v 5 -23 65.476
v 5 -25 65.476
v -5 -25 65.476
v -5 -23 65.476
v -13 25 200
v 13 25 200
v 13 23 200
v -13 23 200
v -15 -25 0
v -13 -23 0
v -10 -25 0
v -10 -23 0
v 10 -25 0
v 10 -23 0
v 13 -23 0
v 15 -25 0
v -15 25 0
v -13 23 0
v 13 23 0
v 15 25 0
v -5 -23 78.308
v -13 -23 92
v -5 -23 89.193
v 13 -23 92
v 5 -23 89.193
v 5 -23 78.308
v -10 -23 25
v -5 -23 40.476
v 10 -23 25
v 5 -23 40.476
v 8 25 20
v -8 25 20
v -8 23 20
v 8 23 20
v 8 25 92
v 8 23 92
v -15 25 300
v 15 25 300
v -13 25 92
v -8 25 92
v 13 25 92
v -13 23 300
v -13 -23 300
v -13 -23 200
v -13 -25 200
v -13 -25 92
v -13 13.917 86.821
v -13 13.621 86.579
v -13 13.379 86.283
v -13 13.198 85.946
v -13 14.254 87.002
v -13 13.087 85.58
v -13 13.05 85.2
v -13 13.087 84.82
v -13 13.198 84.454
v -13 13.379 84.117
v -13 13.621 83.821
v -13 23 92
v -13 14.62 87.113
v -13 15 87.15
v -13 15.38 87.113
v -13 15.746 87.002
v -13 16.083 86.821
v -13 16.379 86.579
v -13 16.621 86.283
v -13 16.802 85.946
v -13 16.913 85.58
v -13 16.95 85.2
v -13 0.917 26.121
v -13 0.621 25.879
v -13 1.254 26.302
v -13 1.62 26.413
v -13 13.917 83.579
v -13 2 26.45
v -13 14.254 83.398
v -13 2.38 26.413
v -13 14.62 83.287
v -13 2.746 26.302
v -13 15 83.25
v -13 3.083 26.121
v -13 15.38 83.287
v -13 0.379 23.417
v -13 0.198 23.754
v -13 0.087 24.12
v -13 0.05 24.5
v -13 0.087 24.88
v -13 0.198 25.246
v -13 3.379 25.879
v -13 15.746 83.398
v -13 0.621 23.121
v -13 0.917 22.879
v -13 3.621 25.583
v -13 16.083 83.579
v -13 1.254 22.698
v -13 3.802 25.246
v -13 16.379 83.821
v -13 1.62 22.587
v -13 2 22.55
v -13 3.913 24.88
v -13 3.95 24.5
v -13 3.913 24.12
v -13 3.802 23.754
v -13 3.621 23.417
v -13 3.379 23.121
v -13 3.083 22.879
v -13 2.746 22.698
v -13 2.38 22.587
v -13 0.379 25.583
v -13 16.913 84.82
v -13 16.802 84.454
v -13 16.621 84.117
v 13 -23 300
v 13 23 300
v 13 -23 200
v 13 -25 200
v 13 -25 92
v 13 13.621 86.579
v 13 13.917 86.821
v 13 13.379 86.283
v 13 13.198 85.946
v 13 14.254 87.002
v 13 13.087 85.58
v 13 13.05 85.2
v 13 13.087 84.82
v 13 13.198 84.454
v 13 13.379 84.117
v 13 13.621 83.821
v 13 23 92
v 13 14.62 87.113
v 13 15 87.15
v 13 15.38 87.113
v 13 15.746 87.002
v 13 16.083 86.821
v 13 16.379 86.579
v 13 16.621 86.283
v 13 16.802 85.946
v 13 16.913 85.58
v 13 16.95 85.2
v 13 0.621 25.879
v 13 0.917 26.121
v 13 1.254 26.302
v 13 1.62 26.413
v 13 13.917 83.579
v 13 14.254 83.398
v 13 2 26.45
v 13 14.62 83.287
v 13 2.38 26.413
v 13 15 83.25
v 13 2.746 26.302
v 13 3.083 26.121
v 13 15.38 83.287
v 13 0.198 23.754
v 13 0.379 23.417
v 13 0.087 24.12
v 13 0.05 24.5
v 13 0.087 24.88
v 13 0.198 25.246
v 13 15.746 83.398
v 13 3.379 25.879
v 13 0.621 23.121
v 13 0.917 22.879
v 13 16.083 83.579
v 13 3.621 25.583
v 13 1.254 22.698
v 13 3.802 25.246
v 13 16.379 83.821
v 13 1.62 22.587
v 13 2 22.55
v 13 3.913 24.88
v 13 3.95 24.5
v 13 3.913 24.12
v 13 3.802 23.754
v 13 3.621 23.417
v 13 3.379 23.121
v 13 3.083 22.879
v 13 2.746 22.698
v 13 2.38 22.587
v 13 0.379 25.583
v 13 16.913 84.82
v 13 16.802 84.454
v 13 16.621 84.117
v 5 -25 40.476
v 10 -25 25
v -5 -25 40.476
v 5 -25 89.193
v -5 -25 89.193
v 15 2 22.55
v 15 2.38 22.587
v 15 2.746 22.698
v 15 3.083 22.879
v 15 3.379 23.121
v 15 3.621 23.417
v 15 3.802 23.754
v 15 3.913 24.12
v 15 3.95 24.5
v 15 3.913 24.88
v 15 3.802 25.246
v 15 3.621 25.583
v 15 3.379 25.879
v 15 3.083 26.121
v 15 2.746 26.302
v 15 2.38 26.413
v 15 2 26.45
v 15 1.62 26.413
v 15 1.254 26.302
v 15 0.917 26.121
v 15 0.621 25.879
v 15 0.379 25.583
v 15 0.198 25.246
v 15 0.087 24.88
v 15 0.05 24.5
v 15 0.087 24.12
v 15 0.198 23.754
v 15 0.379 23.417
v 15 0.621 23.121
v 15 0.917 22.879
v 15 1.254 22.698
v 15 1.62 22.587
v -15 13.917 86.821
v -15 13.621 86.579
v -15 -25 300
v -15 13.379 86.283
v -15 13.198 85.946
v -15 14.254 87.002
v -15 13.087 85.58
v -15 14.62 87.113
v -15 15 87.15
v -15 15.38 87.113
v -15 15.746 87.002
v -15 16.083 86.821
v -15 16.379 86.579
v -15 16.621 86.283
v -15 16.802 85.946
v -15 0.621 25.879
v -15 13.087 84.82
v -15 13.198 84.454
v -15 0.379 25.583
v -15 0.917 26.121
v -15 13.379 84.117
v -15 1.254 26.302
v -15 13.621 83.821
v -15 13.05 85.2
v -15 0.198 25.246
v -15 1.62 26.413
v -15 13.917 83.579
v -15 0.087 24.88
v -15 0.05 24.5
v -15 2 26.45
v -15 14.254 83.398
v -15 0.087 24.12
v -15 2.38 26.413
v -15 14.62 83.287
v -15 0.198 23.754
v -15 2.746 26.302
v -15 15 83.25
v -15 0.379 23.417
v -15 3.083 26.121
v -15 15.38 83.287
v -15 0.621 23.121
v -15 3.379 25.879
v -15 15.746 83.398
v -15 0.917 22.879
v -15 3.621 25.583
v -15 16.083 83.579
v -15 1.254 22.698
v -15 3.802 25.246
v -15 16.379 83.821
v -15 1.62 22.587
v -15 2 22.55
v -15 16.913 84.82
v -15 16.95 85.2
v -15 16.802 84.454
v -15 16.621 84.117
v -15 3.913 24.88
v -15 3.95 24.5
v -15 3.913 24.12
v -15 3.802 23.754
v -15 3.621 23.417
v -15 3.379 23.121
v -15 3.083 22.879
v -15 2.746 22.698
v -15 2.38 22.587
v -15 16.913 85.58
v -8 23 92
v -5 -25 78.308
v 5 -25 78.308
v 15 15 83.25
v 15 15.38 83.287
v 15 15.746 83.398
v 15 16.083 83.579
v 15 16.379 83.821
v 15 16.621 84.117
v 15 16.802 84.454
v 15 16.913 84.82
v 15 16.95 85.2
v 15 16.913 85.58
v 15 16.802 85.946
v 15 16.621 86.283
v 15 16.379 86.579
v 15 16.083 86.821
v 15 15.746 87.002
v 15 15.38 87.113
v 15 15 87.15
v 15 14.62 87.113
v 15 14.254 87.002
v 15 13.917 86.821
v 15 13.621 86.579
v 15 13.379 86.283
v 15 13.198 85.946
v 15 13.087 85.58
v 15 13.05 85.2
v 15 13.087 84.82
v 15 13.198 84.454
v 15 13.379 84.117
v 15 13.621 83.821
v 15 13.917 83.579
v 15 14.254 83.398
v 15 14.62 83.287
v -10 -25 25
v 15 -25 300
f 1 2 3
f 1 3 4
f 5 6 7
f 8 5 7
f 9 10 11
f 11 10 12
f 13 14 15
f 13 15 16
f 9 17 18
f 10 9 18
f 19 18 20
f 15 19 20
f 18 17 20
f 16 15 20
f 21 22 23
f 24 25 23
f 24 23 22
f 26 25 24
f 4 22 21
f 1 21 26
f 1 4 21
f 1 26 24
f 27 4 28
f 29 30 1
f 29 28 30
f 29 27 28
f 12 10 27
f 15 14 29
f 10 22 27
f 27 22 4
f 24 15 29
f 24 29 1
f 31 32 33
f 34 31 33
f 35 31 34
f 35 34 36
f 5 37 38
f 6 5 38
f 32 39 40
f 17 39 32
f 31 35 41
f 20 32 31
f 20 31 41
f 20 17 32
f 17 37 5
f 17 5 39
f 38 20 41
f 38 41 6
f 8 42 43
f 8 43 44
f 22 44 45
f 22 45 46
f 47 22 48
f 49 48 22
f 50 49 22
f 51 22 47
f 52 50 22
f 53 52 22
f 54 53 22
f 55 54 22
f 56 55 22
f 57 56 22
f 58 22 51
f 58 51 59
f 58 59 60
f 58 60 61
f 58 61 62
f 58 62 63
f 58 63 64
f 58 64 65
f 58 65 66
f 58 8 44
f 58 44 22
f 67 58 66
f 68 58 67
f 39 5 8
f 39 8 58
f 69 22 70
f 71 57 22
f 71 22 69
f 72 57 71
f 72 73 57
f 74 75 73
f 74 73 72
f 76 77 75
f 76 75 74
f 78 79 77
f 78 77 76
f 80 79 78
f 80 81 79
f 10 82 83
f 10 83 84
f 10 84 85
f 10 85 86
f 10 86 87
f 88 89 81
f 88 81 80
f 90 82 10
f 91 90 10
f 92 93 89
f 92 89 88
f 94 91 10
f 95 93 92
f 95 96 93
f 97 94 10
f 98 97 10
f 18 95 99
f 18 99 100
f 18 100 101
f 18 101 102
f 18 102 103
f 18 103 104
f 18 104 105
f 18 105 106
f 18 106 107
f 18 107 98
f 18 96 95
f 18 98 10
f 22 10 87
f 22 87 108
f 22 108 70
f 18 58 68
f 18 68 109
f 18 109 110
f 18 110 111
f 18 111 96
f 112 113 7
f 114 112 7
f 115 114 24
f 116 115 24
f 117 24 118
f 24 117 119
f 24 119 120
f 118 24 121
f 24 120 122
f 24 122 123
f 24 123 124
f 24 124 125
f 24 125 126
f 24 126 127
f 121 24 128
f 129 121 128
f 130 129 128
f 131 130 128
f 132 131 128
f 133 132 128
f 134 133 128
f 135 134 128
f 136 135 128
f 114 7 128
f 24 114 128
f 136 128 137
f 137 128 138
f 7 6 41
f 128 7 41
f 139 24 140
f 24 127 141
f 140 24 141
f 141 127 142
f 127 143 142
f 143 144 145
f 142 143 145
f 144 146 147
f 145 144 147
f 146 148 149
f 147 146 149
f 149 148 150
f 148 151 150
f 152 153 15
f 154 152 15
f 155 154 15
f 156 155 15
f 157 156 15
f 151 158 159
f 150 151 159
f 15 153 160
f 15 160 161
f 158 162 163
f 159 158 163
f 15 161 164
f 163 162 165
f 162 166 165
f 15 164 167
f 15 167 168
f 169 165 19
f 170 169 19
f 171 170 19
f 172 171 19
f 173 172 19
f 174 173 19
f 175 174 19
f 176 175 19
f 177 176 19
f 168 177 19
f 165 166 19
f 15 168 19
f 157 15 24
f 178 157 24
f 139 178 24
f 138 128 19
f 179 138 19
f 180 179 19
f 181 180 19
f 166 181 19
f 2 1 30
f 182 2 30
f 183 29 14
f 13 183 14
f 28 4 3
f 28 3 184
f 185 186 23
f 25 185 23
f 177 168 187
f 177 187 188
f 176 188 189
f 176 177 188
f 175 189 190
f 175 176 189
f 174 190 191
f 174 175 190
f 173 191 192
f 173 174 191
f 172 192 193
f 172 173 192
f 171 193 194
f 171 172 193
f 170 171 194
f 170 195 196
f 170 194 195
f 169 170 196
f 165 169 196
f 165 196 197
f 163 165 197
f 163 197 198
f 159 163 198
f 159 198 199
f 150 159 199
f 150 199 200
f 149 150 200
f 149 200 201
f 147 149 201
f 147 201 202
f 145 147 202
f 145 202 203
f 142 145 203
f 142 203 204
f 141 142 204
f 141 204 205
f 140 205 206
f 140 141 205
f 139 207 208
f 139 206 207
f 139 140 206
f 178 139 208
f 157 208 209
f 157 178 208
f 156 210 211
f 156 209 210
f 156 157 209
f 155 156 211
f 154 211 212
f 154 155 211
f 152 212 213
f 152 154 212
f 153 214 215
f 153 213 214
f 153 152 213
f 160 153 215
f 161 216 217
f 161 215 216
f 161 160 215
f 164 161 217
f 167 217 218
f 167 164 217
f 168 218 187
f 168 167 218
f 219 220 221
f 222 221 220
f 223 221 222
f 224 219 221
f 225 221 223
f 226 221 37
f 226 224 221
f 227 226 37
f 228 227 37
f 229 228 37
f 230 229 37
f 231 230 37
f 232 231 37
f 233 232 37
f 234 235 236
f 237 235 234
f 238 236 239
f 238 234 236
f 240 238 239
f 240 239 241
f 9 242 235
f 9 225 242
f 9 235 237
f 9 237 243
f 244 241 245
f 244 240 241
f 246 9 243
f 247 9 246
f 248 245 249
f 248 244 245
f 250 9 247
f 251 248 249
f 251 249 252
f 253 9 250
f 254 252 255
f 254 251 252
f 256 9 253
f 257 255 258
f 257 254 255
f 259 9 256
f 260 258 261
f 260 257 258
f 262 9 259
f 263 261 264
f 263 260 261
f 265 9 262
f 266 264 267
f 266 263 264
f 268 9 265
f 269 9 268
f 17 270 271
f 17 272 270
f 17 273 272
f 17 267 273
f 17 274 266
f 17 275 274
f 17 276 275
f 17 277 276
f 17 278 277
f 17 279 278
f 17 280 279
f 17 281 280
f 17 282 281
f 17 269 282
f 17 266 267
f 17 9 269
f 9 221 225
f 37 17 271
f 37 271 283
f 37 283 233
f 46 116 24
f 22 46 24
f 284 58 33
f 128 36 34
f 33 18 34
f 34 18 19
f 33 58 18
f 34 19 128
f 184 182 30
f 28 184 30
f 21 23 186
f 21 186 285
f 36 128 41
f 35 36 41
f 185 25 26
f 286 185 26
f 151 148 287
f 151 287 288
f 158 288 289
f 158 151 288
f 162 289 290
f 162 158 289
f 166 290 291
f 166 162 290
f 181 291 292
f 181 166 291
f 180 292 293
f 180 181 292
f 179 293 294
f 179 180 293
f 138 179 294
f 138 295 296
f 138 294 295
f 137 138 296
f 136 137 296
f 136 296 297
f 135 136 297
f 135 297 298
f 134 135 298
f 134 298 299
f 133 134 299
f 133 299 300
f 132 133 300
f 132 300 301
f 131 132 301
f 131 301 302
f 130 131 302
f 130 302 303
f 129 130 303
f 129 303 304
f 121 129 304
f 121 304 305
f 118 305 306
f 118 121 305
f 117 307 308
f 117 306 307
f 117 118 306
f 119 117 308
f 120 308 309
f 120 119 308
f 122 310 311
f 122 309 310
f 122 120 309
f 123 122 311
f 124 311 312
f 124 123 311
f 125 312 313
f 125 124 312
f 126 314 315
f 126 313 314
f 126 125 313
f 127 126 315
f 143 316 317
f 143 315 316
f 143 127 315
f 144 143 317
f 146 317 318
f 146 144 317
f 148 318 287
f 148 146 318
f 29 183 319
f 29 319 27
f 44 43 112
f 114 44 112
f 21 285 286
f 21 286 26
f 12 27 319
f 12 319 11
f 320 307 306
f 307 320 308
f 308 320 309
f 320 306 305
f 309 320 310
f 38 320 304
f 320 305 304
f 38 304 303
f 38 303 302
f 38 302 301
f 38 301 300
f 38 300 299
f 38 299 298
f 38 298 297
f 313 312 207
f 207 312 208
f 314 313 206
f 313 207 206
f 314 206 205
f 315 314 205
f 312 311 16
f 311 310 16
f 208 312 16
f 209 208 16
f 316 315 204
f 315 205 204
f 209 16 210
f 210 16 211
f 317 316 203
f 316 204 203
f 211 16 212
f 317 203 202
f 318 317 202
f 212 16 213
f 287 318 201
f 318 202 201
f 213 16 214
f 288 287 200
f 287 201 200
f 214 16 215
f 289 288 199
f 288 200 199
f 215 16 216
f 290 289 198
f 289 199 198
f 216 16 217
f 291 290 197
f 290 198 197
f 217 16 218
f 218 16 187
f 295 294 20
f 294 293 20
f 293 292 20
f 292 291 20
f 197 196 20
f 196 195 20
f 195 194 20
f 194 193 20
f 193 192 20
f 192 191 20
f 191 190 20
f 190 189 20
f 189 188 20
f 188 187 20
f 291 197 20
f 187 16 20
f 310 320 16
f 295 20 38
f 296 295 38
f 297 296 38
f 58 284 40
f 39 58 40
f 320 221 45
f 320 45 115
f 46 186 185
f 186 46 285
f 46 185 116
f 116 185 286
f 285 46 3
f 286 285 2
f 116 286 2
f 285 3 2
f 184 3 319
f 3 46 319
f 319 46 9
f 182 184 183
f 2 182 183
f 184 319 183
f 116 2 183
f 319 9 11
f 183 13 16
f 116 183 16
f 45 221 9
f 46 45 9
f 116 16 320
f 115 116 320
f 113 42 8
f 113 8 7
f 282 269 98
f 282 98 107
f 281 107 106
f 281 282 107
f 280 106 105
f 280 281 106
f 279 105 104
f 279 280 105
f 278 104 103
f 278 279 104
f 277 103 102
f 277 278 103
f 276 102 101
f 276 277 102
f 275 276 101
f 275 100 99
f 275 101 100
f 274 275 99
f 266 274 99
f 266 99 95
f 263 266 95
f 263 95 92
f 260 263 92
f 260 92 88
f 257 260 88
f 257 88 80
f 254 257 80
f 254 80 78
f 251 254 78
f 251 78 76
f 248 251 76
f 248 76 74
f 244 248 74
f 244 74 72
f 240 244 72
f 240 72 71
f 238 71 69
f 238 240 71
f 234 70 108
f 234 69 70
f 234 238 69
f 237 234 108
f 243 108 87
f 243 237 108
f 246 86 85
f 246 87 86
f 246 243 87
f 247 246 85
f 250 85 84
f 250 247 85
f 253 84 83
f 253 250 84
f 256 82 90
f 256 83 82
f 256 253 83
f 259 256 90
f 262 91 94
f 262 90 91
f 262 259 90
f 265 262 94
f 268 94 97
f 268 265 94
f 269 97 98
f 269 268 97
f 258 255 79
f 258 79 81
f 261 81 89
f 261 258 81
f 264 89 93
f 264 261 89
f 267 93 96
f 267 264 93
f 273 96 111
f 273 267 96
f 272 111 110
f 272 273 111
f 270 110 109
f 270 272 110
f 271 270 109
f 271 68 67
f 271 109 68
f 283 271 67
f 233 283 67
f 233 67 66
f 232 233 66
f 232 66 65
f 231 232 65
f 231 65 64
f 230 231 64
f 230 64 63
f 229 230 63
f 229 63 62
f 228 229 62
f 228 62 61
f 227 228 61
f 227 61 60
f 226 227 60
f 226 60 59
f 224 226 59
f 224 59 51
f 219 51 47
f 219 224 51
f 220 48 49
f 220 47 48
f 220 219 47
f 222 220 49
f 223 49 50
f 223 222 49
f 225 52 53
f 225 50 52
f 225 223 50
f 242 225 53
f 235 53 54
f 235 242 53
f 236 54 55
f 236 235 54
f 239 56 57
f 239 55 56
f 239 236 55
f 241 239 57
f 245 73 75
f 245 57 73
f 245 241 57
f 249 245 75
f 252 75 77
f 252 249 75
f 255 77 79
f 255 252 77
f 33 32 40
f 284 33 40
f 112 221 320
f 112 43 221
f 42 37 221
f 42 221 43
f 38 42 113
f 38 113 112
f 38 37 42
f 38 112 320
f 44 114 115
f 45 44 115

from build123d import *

# Parameters (mm, degrees)
SKETCH_1_W               = 30
SKETCH_1_H               = 50
SKETCH_1_W_2             = 26
SKETCH_1_H_2             = 46
EXTRUDE_1_DEPTH          = 300
CUT_EXTRUDE_2_DEPTH      = 302.413337462
CUT_EXTRUDE_2_DEPTH_BACK = 302.413337462
SKETCH_3_R               = 1.95
CUT_EXTRUDE_3_DEPTH      = 8
CUT_EXTRUDE_4_DEPTH      = 13
SKETCH_6_W               = 25
SKETCH_6_H               = 2
SKETCH_6_W_2             = 10.885639634
CUT_EXTRUDE_5_DEPTH      = 5
SKETCH_7_W               = 25
SKETCH_7_H               = 2
CUT_EXTRUDE_6_DEPTH      = 10


with BuildPart() as part:
    # 스케치1 → 보스-돌출1 (new body)
    with BuildSketch(Plane.XY):
        Rectangle(SKETCH_1_W, SKETCH_1_H)
        Rectangle(SKETCH_1_W_2, SKETCH_1_H_2, mode=Mode.SUBTRACT)
    extrude(amount=EXTRUDE_1_DEPTH)

    # 스케치3 → 컷-돌출2 (cut, two sides: drawn at the far end of the back side and taken through both)
    with BuildSketch(Plane(origin=(0, 0, 0), x_dir=(0, 0, -1), z_dir=(1, 0, 0)).offset(-CUT_EXTRUDE_2_DEPTH_BACK)):
        with Locations((-85.2, 15)):
            Circle(SKETCH_3_R)
        with Locations((-24.5, 2)):
            Circle(SKETCH_3_R)
    extrude(amount=CUT_EXTRUDE_2_DEPTH + CUT_EXTRUDE_2_DEPTH_BACK, mode=Mode.SUBTRACT)

    # 스케치4 → 컷-돌출3 (cut, symmetric)
    with BuildSketch(Plane(origin=(0, 0, 0), x_dir=(0, 0, -1), z_dir=(1, 0, 0))):
        Polygon((-20, 25), (-20, -23), (-48, -23), (-74, -23), (-97.25, -23), (-97.25, 25), align=None)
    extrude(amount=CUT_EXTRUDE_3_DEPTH, both=True, mode=Mode.SUBTRACT)

    # 스케치5 → 컷-돌출4 (cut, symmetric)
    with BuildSketch(Plane(origin=(0, 0, 0), x_dir=(0, 0, -1), z_dir=(1, 0, 0))):
        Polygon((-92, 23), (-92, 25), (-200, 25), (-200, -25), (-92, -25), align=None)
    extrude(amount=CUT_EXTRUDE_4_DEPTH, both=True, mode=Mode.SUBTRACT)

    # 스케치6 → 컷-돌출5 (cut, symmetric)
    with BuildSketch(Plane(origin=(0, 0, 0), x_dir=(0, 0, -1), z_dir=(1, 0, 0))):
        with Locations((-52.975965068, -24)):
            Rectangle(SKETCH_6_W, SKETCH_6_H)
        with Locations((-83.750343722, -24)):
            Rectangle(SKETCH_6_W_2, SKETCH_6_H)
    extrude(amount=CUT_EXTRUDE_5_DEPTH, both=True, mode=Mode.SUBTRACT)

    # 스케치7 → 컷-돌출6 (cut, symmetric)
    with BuildSketch(Plane(origin=(0, 0, 0), x_dir=(0, 0, -1), z_dir=(1, 0, 0))):
        with Locations((-12.5, -24)):
            Rectangle(SKETCH_7_W, SKETCH_7_H)
    extrude(amount=CUT_EXTRUDE_6_DEPTH, both=True, mode=Mode.SUBTRACT)


solid = part.part
